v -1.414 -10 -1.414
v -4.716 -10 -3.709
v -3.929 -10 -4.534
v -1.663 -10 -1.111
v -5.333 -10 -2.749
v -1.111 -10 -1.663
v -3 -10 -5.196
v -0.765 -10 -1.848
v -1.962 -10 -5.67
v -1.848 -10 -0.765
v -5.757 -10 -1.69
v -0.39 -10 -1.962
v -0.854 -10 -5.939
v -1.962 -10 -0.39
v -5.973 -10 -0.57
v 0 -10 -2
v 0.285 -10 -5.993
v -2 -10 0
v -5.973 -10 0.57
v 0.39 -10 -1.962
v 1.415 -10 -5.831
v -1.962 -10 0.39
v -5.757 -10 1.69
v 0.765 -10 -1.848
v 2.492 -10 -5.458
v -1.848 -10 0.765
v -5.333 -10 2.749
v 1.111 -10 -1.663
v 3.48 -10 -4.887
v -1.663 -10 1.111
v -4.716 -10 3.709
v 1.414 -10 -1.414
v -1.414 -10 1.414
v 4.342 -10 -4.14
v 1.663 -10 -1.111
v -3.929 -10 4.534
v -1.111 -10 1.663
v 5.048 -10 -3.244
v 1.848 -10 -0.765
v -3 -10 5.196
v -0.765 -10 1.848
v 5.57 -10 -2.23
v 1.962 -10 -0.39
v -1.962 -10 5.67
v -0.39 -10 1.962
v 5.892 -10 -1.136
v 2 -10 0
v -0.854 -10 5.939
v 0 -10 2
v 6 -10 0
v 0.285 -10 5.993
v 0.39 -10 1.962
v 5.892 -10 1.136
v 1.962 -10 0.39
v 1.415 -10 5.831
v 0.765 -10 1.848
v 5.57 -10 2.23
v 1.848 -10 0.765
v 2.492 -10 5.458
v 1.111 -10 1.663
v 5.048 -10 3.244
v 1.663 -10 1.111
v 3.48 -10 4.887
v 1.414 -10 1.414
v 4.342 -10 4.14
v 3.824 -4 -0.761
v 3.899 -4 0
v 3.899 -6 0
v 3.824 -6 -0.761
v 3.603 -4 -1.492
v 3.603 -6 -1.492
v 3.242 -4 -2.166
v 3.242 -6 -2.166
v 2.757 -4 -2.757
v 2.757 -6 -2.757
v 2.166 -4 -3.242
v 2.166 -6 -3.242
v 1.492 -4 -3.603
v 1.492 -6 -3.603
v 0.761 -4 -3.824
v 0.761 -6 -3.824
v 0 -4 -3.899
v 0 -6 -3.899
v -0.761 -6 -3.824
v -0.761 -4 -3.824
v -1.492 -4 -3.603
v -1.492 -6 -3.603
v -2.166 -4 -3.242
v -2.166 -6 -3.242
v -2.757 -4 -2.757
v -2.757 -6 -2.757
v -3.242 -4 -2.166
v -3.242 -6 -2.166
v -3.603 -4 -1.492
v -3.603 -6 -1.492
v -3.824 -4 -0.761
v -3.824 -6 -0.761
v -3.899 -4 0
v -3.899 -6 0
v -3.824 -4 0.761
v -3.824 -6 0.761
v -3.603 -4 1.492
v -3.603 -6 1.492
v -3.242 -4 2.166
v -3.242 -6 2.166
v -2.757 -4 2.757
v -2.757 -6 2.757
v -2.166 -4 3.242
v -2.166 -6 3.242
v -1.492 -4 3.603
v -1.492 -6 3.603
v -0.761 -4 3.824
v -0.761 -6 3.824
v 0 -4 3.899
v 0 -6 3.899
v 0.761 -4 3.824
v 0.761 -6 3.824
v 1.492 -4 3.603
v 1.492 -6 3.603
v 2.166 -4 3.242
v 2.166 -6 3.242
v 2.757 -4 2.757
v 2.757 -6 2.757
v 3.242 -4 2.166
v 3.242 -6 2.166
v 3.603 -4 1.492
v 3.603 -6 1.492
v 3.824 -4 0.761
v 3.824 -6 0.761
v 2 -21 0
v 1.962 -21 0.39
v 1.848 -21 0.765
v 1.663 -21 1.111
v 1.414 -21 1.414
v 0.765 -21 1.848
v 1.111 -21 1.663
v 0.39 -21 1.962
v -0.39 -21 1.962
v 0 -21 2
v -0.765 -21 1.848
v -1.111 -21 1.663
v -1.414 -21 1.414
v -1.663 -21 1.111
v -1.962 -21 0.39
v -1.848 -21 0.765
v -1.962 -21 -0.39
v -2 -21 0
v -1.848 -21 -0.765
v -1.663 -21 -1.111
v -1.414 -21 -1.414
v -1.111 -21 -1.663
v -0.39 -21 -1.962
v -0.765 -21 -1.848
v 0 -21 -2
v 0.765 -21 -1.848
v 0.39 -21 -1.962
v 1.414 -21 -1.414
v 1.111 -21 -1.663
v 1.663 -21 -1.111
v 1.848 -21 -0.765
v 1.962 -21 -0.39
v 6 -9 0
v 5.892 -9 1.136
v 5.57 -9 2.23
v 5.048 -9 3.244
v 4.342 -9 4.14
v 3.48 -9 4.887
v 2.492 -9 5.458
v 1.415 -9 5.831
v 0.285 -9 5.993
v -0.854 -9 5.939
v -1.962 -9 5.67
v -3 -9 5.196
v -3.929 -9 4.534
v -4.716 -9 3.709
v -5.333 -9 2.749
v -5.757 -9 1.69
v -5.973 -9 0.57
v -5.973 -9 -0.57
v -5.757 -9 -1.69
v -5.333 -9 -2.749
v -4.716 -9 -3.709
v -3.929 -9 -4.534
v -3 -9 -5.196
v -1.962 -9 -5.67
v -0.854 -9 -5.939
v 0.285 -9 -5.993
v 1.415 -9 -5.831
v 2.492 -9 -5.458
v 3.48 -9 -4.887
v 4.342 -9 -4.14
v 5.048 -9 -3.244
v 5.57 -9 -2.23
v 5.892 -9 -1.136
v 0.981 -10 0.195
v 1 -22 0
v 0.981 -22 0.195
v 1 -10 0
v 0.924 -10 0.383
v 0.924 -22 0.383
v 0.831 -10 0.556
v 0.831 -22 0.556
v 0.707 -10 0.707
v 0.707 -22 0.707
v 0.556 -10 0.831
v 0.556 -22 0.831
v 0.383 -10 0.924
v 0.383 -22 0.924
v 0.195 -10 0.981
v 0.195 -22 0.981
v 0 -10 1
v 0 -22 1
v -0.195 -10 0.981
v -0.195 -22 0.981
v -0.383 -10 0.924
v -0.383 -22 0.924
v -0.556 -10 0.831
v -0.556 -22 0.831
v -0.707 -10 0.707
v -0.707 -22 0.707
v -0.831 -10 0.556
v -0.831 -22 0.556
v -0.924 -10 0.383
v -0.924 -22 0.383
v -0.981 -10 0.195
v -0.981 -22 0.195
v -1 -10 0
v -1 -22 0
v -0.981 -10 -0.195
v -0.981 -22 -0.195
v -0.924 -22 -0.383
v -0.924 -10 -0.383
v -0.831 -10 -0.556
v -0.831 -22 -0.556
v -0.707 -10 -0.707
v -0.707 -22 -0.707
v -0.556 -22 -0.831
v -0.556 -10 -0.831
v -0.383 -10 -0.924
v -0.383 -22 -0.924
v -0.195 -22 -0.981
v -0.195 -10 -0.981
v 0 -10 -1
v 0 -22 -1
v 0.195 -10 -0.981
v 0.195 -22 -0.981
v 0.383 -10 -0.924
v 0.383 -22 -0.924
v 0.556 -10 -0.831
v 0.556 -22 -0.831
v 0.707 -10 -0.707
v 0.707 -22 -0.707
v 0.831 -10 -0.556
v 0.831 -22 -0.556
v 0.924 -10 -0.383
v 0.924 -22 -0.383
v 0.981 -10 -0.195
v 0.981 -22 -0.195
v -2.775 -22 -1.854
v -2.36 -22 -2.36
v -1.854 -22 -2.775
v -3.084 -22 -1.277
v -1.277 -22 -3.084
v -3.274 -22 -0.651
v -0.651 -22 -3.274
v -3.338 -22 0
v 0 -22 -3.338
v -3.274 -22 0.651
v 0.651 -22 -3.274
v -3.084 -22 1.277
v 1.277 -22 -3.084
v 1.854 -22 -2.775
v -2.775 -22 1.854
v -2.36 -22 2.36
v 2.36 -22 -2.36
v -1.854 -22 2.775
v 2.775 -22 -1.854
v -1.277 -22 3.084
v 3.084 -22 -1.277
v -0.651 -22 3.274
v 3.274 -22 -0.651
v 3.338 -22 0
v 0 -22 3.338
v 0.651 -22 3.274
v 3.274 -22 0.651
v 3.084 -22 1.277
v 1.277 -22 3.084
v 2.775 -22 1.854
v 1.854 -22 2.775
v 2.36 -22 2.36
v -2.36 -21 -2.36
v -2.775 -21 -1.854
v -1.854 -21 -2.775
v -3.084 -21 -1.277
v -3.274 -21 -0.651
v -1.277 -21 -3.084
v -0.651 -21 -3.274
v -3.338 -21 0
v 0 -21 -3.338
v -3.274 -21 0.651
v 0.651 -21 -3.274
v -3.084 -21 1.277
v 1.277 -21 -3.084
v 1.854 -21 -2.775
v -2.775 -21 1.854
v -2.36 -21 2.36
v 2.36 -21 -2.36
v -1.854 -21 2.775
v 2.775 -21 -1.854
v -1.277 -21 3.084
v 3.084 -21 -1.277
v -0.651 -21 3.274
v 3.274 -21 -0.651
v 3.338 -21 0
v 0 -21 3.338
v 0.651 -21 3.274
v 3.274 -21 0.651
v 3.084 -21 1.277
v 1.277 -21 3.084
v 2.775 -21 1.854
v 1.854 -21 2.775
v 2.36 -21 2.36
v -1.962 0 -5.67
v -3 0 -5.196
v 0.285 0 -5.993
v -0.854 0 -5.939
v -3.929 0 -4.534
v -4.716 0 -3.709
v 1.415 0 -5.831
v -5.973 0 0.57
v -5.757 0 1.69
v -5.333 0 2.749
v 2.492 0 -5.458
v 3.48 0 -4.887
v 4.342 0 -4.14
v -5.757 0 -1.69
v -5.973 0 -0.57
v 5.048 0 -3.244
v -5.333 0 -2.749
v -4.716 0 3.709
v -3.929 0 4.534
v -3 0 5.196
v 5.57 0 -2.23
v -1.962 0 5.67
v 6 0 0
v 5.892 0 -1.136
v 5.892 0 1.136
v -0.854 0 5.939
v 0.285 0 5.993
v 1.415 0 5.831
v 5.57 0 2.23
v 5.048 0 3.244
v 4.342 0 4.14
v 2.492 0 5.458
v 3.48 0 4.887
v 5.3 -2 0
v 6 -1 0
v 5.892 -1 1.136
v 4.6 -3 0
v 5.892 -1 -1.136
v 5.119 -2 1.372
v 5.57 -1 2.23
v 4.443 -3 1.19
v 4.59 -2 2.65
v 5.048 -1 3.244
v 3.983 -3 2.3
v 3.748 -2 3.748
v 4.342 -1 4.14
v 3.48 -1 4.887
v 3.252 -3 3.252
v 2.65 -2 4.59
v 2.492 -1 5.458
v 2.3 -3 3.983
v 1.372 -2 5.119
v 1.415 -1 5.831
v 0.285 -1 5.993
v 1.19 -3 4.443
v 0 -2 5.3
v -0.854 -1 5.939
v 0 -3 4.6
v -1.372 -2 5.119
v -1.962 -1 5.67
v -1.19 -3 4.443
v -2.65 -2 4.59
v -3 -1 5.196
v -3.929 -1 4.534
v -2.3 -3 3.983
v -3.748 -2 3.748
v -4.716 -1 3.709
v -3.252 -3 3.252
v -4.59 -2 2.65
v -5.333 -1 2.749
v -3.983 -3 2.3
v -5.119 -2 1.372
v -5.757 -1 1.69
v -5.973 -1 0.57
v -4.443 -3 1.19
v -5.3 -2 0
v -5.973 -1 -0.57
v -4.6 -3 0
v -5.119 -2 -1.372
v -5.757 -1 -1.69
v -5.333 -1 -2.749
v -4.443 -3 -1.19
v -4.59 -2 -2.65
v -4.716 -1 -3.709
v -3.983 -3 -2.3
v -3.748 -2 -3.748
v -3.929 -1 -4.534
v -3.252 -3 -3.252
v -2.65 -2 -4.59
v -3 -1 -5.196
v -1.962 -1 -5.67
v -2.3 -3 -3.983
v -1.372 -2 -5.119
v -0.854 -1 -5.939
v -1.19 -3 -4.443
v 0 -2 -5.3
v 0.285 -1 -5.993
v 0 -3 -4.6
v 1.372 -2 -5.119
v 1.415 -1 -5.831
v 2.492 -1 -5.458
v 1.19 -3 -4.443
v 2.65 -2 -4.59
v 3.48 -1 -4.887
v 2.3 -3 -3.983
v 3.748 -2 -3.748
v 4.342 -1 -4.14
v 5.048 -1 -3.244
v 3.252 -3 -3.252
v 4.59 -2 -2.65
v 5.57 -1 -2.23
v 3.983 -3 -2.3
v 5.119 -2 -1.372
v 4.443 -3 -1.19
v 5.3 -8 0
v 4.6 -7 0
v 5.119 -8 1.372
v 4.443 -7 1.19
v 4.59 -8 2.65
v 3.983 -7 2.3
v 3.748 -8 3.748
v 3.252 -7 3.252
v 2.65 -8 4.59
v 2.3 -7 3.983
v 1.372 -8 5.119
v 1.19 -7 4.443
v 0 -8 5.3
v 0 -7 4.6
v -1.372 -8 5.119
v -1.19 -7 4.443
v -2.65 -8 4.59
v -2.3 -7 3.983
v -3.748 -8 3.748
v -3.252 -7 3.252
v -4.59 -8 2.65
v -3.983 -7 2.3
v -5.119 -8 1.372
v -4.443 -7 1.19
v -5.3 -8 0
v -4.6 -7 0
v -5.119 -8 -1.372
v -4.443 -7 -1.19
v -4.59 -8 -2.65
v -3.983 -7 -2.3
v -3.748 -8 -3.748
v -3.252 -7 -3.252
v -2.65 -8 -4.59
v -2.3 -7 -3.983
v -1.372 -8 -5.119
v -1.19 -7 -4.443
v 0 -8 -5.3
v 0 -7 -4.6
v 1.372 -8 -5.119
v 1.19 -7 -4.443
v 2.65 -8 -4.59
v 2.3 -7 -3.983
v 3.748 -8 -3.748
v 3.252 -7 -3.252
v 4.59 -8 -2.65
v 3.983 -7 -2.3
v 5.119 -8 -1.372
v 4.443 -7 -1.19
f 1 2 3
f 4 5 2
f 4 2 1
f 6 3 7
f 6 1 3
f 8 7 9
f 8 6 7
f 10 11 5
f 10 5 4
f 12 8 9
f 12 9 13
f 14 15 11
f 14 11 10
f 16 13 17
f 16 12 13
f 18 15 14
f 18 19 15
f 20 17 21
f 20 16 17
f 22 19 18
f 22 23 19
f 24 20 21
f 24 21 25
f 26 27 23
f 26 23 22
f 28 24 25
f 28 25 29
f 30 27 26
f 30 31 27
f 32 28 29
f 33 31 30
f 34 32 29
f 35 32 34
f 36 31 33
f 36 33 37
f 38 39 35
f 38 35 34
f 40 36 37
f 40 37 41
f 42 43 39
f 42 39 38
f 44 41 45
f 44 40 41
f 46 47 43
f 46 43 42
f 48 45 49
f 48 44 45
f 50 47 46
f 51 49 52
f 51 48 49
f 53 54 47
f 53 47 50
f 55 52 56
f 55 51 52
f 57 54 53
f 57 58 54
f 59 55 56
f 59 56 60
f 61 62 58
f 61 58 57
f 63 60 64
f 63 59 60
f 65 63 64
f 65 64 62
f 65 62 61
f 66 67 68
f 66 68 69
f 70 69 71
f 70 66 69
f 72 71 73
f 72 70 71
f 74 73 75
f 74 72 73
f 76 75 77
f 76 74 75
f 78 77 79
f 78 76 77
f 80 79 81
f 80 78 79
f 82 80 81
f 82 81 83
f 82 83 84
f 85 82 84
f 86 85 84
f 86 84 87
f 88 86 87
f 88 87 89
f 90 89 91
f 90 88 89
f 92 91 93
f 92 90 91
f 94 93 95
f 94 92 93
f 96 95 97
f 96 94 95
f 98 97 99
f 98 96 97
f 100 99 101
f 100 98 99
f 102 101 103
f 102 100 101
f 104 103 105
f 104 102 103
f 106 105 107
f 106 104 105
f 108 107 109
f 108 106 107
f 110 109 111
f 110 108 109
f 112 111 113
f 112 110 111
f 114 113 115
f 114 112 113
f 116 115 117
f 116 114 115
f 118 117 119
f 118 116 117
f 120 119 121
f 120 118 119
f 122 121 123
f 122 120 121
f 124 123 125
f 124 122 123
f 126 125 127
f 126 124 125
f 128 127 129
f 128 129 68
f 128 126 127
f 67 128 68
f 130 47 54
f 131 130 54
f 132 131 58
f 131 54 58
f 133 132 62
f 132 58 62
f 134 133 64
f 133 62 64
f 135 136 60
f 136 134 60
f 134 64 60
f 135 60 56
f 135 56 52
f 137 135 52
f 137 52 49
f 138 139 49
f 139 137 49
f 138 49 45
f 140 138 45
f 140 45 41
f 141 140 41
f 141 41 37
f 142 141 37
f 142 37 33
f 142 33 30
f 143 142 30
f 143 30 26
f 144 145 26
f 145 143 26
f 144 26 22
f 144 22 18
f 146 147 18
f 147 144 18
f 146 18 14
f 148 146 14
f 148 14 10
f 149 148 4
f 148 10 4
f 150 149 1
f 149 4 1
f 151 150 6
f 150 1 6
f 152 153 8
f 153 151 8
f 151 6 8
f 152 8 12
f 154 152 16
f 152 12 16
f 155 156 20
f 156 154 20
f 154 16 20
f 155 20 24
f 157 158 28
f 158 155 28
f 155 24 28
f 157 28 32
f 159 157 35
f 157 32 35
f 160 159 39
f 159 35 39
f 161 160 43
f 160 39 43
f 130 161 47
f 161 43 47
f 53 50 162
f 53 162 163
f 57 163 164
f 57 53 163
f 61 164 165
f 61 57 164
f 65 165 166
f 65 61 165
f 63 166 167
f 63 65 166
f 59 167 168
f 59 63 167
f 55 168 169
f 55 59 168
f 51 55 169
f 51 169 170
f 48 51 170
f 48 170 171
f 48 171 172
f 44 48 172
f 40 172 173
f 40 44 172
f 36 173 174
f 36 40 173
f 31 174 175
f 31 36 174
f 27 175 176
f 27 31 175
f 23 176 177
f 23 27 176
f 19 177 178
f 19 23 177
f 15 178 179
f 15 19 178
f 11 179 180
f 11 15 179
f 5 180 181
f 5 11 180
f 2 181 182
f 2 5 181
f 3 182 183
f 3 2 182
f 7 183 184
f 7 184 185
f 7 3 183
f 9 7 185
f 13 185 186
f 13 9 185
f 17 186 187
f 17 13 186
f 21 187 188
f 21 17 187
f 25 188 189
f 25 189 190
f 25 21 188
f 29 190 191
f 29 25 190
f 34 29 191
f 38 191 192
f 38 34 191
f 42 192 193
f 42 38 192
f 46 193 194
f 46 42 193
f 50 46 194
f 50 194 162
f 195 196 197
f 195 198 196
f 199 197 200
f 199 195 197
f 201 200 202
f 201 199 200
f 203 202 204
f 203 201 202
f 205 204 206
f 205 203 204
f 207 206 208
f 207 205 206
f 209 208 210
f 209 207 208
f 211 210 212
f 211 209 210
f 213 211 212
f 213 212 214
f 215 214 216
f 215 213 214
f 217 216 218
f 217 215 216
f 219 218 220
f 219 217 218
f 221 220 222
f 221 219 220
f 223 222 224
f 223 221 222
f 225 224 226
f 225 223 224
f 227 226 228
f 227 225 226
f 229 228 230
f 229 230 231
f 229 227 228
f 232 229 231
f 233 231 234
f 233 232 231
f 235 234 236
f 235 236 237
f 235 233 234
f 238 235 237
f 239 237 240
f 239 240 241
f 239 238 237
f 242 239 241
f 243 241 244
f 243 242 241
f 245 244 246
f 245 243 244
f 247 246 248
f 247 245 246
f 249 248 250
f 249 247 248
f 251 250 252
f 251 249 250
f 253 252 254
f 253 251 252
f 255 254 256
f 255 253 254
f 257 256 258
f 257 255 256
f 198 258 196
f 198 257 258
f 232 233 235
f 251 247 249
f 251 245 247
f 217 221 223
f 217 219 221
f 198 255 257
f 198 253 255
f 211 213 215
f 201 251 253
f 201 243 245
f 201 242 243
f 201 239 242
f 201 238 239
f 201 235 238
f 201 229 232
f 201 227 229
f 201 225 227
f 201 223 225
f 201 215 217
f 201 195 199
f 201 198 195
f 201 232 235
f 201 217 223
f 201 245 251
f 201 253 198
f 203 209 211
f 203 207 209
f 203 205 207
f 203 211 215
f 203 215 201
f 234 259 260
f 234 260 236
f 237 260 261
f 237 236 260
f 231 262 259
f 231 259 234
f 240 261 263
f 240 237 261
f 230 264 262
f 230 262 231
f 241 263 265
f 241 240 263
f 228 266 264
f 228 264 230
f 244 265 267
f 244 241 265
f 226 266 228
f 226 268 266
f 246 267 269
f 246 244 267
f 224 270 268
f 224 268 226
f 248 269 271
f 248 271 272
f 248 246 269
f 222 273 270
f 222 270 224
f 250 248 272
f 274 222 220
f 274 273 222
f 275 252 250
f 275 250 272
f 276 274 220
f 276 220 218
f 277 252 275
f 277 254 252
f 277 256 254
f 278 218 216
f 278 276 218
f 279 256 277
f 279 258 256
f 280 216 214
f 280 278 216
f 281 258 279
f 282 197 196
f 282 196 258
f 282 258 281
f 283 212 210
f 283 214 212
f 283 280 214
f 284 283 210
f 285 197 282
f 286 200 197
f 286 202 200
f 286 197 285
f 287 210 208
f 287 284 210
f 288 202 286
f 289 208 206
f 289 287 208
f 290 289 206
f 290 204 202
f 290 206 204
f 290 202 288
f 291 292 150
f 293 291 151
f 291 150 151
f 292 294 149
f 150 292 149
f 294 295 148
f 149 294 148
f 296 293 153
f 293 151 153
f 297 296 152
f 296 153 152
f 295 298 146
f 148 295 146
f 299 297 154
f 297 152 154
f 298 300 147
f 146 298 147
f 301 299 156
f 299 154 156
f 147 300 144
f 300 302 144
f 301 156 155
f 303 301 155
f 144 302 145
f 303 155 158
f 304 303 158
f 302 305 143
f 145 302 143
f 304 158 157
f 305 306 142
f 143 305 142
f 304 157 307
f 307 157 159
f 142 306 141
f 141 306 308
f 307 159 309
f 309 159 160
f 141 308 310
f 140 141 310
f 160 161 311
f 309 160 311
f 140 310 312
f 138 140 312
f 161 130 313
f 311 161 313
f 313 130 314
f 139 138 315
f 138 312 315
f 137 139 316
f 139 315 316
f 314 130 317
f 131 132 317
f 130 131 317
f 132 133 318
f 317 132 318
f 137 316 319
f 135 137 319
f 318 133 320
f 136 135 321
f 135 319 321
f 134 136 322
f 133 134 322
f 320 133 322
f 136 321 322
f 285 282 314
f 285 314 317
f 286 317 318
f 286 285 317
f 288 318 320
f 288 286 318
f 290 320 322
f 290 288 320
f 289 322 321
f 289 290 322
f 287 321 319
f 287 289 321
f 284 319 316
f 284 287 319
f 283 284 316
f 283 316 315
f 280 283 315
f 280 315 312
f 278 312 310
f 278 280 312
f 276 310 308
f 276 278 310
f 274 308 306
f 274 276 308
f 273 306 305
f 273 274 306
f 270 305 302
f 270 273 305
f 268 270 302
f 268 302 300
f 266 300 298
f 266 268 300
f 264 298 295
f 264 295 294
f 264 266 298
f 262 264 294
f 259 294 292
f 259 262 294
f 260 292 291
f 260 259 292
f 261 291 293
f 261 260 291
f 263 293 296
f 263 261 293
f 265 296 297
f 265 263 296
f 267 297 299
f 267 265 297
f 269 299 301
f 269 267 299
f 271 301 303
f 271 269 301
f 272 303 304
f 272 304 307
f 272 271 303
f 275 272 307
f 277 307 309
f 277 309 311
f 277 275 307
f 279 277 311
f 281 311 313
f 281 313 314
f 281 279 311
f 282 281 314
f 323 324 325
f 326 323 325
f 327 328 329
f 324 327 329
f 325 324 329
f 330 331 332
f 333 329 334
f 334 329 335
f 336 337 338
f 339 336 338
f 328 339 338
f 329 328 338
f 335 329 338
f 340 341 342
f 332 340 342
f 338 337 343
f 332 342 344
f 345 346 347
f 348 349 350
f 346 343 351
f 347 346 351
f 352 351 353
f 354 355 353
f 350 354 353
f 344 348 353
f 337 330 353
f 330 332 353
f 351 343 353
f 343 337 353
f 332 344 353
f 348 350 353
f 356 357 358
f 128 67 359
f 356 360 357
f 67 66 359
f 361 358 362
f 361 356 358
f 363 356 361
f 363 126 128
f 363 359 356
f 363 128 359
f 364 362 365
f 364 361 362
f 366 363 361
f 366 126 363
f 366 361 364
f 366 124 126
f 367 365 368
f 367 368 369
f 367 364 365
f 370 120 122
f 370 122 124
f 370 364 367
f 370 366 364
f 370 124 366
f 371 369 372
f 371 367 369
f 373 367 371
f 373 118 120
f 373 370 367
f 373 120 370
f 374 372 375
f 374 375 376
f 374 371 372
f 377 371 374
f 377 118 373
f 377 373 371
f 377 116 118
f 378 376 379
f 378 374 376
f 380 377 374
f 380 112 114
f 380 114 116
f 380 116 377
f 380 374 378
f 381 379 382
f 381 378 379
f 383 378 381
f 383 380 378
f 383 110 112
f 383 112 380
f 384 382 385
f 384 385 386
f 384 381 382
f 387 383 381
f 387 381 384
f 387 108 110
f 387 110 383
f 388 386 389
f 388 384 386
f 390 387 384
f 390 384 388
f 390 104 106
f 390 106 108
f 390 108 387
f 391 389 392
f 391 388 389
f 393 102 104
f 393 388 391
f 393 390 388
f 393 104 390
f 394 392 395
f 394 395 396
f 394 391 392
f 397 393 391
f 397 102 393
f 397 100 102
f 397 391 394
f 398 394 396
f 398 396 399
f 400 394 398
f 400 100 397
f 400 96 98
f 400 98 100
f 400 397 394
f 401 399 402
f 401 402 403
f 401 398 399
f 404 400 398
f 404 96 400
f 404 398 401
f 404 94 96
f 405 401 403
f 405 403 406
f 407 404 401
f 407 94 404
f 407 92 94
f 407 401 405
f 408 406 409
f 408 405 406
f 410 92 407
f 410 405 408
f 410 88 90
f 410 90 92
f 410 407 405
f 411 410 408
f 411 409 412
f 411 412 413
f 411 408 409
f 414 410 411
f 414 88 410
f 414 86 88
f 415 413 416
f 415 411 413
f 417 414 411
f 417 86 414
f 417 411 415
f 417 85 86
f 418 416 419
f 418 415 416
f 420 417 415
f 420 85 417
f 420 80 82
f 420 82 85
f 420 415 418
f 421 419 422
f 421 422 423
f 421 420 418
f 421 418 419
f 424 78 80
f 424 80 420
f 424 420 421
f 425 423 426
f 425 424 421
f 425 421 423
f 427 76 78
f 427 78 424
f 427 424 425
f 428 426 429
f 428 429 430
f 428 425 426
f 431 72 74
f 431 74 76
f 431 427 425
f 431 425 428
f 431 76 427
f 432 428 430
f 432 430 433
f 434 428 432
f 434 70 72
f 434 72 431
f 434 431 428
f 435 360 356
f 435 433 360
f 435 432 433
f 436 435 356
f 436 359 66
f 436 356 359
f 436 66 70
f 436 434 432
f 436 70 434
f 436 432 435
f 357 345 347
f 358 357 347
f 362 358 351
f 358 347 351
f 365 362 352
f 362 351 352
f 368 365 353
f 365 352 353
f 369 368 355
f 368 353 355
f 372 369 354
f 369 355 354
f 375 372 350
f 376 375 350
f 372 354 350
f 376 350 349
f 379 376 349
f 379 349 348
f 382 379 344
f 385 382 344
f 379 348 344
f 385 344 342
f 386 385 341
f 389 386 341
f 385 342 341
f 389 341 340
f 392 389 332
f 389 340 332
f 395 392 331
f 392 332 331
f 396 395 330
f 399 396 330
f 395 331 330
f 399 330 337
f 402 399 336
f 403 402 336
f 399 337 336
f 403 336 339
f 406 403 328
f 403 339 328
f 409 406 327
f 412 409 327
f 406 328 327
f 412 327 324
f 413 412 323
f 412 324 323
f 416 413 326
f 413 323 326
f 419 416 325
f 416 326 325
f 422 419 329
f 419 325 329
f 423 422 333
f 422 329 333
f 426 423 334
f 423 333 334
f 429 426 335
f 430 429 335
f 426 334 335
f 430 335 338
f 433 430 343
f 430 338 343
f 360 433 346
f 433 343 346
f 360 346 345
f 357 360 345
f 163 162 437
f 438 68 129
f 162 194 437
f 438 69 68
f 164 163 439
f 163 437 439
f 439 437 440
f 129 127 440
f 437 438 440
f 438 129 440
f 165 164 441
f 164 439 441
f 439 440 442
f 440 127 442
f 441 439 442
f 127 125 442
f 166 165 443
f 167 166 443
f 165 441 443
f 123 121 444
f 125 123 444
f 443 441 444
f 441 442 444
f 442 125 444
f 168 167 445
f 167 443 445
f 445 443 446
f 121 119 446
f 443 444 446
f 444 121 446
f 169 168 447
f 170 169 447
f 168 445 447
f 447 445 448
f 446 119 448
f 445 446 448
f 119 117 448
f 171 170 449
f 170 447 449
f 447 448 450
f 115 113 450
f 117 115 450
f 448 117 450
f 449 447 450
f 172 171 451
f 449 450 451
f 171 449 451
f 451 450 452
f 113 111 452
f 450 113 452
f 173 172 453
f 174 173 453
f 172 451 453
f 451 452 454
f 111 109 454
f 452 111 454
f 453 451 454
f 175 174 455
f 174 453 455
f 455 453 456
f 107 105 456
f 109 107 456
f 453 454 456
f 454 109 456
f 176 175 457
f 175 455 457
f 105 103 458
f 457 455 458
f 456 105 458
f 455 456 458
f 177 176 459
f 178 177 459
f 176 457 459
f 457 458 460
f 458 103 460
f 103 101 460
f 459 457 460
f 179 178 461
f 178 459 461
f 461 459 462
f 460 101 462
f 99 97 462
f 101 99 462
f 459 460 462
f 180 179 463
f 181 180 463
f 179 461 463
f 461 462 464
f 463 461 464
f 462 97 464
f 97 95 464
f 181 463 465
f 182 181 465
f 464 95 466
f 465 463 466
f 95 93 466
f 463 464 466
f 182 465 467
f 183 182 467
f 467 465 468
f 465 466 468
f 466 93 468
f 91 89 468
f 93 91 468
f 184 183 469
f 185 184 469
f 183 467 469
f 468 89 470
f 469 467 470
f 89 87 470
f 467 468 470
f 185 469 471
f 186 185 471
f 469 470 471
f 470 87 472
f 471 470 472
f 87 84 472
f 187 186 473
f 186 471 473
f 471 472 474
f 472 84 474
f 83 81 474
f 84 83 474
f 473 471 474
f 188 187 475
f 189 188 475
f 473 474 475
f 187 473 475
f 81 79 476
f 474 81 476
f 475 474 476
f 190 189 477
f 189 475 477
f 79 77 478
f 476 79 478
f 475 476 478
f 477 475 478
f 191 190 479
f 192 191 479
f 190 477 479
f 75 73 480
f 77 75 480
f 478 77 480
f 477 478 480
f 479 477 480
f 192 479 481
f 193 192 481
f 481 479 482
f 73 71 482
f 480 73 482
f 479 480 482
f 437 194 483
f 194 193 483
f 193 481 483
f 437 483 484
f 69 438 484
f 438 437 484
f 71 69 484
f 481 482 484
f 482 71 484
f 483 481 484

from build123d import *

# Parameters (mm, degrees)
F0_R      = 2
F0_R_2    = 1
F1_DEPTH  = 22
F0_R_3    = 6
F0_R_4    = 3.5
F2_DEPTH  = 1
F2_FACE_R = 6
F3_DEPTH  = 3
F3_TAPER  = 35
F4_DEPTH  = 2
F7_R      = 3.33782825
F7_R_2    = 2
F7_R_3    = 1
F8_DEPTH  = 1


# Not quite as in the source:
# - a feature of the source that left no trace in its solid (it failed there, or was rolled back) is left out
# - a pattern or mirror of a feature is missing from the dataset's text; its kind, count and spacing are read off the source's solid


with BuildPart() as f1:
    # F0 (on Front) → F1 (new body)
    with BuildSketch(Plane.XZ):
        Circle(F0_R)
        Circle(F0_R_2, mode=Mode.SUBTRACT)
    extrude(amount=F1_DEPTH)

    # F2_copies: F2 across plane


with BuildPart() as f2:
    # F0 (on Front) → F2 (new body)
    with BuildSketch(Plane.XZ):
        Circle(F0_R_3)
        Circle(F0_R_4, mode=Mode.SUBTRACT)
        Circle(F0_R_4)
        Circle(F0_R, mode=Mode.SUBTRACT)
        Circle(F0_R)
        Circle(F0_R_2, mode=Mode.SUBTRACT)
        Circle(F0_R_2)
    extrude(amount=F2_DEPTH)


with BuildPart() as f1_1:
    add(f1.part)
    add(f2.part.mirror(Plane(origin=(0, -5, 0), x_dir=(0, 0, -1), z_dir=(0, -1, 0))))


    add(f2.part)  # F3 merges F2
    # F2_face (on face) → F3 (join)
    with BuildSketch(Plane.XZ.offset(1)):
        Circle(F2_FACE_R)
    f3 = extrude(amount=F3_DEPTH, taper=F3_TAPER)

    # F3_copies: F3 across plane
    add(f3.mirror(Plane(origin=(0, -5, 0), x_dir=(0, 0, -1), z_dir=(0, -1, 0))))

    # F4 (add): faces of the model
    f4_faces = [f1_1.faces().sort_by_distance(p)[0] for p in [
        (-3.7890863377, -4, 0),
        (0, -4, 0),
    ]]
    extrude(f4_faces, amount=F4_DEPTH)

    # F7 (on face) → F8 (join)
    with BuildSketch(Plane.XZ.offset(22)):
        Circle(F7_R)
        Circle(F7_R_2, mode=Mode.SUBTRACT)
        Circle(F7_R_2)
        Circle(F7_R_3, mode=Mode.SUBTRACT)
    extrude(amount=-F8_DEPTH)


solid = f1_1.part
